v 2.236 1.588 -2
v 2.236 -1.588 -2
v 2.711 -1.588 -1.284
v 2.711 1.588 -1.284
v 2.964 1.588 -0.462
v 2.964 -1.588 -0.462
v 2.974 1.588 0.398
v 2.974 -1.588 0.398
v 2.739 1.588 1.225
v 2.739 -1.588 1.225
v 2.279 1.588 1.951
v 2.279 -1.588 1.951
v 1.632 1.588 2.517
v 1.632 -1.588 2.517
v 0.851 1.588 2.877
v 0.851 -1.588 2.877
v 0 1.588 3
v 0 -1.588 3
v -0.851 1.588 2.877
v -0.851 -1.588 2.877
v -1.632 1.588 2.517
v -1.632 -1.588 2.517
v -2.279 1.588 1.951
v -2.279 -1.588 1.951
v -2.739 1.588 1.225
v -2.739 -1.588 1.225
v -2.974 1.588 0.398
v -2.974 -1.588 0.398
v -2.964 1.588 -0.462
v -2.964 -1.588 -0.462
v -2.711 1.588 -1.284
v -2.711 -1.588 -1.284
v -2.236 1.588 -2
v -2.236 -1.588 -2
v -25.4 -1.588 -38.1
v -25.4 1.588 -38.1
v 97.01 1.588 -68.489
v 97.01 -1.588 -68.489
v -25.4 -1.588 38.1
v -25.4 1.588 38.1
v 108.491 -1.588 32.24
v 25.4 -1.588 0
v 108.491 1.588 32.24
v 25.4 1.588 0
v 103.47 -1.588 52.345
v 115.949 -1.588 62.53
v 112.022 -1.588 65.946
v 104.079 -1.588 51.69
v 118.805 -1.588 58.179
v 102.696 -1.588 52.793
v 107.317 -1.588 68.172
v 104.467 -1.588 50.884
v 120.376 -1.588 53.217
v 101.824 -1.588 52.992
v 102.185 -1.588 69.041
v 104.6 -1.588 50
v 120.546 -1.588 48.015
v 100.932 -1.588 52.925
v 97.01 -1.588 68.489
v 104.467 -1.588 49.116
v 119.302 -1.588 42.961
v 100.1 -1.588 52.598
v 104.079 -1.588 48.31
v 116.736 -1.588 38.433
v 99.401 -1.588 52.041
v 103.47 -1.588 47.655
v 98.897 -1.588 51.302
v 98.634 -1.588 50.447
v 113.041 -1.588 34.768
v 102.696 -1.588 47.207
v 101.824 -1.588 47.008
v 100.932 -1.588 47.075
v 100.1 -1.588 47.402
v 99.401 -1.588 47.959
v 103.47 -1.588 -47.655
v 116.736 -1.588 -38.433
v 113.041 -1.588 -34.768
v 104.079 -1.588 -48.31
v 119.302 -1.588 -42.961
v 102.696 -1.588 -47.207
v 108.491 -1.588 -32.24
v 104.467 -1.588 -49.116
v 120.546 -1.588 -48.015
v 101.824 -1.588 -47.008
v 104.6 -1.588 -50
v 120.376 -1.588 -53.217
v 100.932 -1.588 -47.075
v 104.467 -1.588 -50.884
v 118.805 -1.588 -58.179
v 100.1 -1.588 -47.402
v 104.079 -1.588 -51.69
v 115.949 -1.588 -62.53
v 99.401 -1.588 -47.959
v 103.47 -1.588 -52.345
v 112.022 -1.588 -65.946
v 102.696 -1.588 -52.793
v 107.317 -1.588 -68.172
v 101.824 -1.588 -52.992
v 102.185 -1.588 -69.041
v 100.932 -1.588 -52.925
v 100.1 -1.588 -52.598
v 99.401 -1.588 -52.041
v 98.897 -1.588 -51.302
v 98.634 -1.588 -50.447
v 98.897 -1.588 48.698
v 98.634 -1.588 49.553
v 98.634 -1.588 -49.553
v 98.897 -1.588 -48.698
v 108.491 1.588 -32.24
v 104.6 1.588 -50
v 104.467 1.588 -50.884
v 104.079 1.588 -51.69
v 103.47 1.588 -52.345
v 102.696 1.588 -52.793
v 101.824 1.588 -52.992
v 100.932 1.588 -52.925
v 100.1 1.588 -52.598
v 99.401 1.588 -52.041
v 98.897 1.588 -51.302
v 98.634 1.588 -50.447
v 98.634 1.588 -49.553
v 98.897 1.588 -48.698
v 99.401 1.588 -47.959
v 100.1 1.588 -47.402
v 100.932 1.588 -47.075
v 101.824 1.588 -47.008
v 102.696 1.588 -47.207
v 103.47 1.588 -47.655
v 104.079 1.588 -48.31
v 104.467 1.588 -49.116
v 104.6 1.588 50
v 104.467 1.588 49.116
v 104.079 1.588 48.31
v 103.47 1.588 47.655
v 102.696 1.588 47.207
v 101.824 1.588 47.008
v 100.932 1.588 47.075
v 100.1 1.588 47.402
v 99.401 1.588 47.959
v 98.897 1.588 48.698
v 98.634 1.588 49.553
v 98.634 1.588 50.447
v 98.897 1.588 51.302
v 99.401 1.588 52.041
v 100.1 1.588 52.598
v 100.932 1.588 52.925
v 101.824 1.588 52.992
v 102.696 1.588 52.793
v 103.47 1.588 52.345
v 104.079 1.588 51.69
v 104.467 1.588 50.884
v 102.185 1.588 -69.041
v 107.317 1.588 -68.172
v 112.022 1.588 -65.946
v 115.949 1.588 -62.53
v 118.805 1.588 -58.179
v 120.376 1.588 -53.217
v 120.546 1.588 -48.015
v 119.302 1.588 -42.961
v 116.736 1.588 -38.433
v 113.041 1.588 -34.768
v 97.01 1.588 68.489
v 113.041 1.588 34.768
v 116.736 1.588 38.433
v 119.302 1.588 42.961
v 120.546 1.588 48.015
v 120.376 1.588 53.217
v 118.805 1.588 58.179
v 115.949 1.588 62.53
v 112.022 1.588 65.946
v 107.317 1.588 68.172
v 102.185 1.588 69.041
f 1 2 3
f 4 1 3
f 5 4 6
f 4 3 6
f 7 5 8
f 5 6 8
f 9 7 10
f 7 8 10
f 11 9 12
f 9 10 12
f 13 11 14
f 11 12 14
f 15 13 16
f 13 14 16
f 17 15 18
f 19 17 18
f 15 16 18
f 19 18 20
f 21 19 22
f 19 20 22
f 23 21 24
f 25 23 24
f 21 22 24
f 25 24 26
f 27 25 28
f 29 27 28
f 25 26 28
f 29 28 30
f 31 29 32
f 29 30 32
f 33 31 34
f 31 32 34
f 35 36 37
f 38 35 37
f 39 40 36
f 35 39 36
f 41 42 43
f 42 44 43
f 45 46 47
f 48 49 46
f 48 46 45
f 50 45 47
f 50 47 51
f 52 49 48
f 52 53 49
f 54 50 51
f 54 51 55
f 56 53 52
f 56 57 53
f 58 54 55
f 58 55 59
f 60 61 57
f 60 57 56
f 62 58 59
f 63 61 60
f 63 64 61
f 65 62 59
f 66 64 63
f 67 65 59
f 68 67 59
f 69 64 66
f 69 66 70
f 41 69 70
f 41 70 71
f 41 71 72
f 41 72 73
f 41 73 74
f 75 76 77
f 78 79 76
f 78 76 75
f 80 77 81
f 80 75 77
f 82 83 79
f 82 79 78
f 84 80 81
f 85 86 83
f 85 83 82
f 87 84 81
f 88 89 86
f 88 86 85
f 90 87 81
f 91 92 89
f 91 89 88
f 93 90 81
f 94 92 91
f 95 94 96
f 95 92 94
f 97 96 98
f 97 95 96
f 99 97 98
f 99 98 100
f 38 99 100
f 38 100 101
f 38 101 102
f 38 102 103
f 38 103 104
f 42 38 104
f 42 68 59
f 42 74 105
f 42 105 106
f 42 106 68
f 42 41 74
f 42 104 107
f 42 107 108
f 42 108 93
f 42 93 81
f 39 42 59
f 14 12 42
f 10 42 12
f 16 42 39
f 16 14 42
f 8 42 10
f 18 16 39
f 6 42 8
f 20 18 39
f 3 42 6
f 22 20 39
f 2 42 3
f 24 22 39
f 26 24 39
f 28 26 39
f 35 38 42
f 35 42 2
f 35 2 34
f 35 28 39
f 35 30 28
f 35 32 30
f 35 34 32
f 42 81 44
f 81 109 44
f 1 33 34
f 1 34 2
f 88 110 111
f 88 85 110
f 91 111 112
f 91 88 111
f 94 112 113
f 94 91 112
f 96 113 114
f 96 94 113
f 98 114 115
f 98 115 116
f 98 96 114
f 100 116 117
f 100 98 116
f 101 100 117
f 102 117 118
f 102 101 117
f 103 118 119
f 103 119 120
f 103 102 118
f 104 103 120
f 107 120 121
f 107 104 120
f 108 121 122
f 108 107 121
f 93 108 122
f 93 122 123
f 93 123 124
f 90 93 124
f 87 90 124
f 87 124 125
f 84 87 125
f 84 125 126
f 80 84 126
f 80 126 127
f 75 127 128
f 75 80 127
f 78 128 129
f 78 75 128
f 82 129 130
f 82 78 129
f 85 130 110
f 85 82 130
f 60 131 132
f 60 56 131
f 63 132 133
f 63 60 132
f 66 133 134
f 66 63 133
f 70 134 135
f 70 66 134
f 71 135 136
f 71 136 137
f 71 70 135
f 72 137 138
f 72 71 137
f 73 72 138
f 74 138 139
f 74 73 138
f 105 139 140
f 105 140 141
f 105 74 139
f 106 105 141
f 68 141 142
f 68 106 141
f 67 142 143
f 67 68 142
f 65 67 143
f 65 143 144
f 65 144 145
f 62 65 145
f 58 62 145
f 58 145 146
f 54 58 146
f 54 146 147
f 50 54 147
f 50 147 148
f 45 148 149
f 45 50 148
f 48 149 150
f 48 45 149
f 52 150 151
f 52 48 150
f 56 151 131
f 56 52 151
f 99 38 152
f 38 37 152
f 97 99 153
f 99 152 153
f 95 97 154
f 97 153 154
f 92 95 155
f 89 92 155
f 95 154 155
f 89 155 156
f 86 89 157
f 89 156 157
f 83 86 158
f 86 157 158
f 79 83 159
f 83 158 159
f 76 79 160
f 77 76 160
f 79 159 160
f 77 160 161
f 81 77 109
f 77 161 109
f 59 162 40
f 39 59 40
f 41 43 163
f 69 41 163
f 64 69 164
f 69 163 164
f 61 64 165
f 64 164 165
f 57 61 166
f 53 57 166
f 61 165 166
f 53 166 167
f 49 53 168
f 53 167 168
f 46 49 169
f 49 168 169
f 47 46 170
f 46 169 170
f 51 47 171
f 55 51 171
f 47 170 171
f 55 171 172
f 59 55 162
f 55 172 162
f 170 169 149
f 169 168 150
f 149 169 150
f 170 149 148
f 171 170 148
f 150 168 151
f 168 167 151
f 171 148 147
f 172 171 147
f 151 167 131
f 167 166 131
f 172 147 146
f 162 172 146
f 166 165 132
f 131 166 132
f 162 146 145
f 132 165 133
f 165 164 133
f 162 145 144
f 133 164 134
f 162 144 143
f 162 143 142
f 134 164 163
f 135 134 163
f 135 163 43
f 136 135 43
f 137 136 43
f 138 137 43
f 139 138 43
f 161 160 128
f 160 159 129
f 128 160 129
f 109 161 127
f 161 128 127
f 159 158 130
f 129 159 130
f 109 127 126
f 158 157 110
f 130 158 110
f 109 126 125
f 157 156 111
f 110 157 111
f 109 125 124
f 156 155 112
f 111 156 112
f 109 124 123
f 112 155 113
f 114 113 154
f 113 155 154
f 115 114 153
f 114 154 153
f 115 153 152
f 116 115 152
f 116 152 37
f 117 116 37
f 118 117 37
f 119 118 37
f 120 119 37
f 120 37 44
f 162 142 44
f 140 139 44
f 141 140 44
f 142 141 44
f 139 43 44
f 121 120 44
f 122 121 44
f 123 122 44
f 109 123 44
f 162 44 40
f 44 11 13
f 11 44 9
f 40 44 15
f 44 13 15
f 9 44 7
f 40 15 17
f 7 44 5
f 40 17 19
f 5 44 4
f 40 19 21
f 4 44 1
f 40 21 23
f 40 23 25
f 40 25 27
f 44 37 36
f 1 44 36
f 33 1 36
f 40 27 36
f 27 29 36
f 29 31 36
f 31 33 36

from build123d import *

# Parameters (mm, degrees)
SKETCH1_R           = 3
BOSS_EXTRUDE1_DEPTH = 1.5875


with BuildPart() as part:
    # Sketch1 → Boss-Extrude1 (new body, symmetric)
    with BuildSketch(Plane(origin=(0, 0, 0), x_dir=(1, 0, 0), z_dir=(0, 1, 0))):
        with BuildLine():
            Line((-25.4, 38.1), (97.010086235, 68.488785564))
            ThreePointArc((97.010086235, 68.488785564), (119.760857484, 55.752021858), (108.491020074, 32.240035407))
            Line((108.491020074, 32.240035407), (25.4, 0))
            Line((25.4, 0), (108.491020074, -32.240035407))
            ThreePointArc((108.491020074, -32.240035407), (119.760857484, -55.752021858), (97.010086235, -68.488785564))
            Line((97.010086235, -68.488785564), (-25.4, -38.1))
            Line((-25.4, -38.1), (-25.4, 38.1))
        make_face()
        with Locations((101.6, 50)):
            Circle(SKETCH1_R, mode=Mode.SUBTRACT)
        with Locations((101.6, -50)):
            Circle(SKETCH1_R, mode=Mode.SUBTRACT)
        with BuildLine():
            Line((-2.236067977, 2), (2.236067977, 2))
            ThreePointArc((2.236067977, 2), (0, -3), (-2.236067977, 2))
        make_face(mode=Mode.SUBTRACT)
    extrude(amount=BOSS_EXTRUDE1_DEPTH, both=True)


solid = part.part
